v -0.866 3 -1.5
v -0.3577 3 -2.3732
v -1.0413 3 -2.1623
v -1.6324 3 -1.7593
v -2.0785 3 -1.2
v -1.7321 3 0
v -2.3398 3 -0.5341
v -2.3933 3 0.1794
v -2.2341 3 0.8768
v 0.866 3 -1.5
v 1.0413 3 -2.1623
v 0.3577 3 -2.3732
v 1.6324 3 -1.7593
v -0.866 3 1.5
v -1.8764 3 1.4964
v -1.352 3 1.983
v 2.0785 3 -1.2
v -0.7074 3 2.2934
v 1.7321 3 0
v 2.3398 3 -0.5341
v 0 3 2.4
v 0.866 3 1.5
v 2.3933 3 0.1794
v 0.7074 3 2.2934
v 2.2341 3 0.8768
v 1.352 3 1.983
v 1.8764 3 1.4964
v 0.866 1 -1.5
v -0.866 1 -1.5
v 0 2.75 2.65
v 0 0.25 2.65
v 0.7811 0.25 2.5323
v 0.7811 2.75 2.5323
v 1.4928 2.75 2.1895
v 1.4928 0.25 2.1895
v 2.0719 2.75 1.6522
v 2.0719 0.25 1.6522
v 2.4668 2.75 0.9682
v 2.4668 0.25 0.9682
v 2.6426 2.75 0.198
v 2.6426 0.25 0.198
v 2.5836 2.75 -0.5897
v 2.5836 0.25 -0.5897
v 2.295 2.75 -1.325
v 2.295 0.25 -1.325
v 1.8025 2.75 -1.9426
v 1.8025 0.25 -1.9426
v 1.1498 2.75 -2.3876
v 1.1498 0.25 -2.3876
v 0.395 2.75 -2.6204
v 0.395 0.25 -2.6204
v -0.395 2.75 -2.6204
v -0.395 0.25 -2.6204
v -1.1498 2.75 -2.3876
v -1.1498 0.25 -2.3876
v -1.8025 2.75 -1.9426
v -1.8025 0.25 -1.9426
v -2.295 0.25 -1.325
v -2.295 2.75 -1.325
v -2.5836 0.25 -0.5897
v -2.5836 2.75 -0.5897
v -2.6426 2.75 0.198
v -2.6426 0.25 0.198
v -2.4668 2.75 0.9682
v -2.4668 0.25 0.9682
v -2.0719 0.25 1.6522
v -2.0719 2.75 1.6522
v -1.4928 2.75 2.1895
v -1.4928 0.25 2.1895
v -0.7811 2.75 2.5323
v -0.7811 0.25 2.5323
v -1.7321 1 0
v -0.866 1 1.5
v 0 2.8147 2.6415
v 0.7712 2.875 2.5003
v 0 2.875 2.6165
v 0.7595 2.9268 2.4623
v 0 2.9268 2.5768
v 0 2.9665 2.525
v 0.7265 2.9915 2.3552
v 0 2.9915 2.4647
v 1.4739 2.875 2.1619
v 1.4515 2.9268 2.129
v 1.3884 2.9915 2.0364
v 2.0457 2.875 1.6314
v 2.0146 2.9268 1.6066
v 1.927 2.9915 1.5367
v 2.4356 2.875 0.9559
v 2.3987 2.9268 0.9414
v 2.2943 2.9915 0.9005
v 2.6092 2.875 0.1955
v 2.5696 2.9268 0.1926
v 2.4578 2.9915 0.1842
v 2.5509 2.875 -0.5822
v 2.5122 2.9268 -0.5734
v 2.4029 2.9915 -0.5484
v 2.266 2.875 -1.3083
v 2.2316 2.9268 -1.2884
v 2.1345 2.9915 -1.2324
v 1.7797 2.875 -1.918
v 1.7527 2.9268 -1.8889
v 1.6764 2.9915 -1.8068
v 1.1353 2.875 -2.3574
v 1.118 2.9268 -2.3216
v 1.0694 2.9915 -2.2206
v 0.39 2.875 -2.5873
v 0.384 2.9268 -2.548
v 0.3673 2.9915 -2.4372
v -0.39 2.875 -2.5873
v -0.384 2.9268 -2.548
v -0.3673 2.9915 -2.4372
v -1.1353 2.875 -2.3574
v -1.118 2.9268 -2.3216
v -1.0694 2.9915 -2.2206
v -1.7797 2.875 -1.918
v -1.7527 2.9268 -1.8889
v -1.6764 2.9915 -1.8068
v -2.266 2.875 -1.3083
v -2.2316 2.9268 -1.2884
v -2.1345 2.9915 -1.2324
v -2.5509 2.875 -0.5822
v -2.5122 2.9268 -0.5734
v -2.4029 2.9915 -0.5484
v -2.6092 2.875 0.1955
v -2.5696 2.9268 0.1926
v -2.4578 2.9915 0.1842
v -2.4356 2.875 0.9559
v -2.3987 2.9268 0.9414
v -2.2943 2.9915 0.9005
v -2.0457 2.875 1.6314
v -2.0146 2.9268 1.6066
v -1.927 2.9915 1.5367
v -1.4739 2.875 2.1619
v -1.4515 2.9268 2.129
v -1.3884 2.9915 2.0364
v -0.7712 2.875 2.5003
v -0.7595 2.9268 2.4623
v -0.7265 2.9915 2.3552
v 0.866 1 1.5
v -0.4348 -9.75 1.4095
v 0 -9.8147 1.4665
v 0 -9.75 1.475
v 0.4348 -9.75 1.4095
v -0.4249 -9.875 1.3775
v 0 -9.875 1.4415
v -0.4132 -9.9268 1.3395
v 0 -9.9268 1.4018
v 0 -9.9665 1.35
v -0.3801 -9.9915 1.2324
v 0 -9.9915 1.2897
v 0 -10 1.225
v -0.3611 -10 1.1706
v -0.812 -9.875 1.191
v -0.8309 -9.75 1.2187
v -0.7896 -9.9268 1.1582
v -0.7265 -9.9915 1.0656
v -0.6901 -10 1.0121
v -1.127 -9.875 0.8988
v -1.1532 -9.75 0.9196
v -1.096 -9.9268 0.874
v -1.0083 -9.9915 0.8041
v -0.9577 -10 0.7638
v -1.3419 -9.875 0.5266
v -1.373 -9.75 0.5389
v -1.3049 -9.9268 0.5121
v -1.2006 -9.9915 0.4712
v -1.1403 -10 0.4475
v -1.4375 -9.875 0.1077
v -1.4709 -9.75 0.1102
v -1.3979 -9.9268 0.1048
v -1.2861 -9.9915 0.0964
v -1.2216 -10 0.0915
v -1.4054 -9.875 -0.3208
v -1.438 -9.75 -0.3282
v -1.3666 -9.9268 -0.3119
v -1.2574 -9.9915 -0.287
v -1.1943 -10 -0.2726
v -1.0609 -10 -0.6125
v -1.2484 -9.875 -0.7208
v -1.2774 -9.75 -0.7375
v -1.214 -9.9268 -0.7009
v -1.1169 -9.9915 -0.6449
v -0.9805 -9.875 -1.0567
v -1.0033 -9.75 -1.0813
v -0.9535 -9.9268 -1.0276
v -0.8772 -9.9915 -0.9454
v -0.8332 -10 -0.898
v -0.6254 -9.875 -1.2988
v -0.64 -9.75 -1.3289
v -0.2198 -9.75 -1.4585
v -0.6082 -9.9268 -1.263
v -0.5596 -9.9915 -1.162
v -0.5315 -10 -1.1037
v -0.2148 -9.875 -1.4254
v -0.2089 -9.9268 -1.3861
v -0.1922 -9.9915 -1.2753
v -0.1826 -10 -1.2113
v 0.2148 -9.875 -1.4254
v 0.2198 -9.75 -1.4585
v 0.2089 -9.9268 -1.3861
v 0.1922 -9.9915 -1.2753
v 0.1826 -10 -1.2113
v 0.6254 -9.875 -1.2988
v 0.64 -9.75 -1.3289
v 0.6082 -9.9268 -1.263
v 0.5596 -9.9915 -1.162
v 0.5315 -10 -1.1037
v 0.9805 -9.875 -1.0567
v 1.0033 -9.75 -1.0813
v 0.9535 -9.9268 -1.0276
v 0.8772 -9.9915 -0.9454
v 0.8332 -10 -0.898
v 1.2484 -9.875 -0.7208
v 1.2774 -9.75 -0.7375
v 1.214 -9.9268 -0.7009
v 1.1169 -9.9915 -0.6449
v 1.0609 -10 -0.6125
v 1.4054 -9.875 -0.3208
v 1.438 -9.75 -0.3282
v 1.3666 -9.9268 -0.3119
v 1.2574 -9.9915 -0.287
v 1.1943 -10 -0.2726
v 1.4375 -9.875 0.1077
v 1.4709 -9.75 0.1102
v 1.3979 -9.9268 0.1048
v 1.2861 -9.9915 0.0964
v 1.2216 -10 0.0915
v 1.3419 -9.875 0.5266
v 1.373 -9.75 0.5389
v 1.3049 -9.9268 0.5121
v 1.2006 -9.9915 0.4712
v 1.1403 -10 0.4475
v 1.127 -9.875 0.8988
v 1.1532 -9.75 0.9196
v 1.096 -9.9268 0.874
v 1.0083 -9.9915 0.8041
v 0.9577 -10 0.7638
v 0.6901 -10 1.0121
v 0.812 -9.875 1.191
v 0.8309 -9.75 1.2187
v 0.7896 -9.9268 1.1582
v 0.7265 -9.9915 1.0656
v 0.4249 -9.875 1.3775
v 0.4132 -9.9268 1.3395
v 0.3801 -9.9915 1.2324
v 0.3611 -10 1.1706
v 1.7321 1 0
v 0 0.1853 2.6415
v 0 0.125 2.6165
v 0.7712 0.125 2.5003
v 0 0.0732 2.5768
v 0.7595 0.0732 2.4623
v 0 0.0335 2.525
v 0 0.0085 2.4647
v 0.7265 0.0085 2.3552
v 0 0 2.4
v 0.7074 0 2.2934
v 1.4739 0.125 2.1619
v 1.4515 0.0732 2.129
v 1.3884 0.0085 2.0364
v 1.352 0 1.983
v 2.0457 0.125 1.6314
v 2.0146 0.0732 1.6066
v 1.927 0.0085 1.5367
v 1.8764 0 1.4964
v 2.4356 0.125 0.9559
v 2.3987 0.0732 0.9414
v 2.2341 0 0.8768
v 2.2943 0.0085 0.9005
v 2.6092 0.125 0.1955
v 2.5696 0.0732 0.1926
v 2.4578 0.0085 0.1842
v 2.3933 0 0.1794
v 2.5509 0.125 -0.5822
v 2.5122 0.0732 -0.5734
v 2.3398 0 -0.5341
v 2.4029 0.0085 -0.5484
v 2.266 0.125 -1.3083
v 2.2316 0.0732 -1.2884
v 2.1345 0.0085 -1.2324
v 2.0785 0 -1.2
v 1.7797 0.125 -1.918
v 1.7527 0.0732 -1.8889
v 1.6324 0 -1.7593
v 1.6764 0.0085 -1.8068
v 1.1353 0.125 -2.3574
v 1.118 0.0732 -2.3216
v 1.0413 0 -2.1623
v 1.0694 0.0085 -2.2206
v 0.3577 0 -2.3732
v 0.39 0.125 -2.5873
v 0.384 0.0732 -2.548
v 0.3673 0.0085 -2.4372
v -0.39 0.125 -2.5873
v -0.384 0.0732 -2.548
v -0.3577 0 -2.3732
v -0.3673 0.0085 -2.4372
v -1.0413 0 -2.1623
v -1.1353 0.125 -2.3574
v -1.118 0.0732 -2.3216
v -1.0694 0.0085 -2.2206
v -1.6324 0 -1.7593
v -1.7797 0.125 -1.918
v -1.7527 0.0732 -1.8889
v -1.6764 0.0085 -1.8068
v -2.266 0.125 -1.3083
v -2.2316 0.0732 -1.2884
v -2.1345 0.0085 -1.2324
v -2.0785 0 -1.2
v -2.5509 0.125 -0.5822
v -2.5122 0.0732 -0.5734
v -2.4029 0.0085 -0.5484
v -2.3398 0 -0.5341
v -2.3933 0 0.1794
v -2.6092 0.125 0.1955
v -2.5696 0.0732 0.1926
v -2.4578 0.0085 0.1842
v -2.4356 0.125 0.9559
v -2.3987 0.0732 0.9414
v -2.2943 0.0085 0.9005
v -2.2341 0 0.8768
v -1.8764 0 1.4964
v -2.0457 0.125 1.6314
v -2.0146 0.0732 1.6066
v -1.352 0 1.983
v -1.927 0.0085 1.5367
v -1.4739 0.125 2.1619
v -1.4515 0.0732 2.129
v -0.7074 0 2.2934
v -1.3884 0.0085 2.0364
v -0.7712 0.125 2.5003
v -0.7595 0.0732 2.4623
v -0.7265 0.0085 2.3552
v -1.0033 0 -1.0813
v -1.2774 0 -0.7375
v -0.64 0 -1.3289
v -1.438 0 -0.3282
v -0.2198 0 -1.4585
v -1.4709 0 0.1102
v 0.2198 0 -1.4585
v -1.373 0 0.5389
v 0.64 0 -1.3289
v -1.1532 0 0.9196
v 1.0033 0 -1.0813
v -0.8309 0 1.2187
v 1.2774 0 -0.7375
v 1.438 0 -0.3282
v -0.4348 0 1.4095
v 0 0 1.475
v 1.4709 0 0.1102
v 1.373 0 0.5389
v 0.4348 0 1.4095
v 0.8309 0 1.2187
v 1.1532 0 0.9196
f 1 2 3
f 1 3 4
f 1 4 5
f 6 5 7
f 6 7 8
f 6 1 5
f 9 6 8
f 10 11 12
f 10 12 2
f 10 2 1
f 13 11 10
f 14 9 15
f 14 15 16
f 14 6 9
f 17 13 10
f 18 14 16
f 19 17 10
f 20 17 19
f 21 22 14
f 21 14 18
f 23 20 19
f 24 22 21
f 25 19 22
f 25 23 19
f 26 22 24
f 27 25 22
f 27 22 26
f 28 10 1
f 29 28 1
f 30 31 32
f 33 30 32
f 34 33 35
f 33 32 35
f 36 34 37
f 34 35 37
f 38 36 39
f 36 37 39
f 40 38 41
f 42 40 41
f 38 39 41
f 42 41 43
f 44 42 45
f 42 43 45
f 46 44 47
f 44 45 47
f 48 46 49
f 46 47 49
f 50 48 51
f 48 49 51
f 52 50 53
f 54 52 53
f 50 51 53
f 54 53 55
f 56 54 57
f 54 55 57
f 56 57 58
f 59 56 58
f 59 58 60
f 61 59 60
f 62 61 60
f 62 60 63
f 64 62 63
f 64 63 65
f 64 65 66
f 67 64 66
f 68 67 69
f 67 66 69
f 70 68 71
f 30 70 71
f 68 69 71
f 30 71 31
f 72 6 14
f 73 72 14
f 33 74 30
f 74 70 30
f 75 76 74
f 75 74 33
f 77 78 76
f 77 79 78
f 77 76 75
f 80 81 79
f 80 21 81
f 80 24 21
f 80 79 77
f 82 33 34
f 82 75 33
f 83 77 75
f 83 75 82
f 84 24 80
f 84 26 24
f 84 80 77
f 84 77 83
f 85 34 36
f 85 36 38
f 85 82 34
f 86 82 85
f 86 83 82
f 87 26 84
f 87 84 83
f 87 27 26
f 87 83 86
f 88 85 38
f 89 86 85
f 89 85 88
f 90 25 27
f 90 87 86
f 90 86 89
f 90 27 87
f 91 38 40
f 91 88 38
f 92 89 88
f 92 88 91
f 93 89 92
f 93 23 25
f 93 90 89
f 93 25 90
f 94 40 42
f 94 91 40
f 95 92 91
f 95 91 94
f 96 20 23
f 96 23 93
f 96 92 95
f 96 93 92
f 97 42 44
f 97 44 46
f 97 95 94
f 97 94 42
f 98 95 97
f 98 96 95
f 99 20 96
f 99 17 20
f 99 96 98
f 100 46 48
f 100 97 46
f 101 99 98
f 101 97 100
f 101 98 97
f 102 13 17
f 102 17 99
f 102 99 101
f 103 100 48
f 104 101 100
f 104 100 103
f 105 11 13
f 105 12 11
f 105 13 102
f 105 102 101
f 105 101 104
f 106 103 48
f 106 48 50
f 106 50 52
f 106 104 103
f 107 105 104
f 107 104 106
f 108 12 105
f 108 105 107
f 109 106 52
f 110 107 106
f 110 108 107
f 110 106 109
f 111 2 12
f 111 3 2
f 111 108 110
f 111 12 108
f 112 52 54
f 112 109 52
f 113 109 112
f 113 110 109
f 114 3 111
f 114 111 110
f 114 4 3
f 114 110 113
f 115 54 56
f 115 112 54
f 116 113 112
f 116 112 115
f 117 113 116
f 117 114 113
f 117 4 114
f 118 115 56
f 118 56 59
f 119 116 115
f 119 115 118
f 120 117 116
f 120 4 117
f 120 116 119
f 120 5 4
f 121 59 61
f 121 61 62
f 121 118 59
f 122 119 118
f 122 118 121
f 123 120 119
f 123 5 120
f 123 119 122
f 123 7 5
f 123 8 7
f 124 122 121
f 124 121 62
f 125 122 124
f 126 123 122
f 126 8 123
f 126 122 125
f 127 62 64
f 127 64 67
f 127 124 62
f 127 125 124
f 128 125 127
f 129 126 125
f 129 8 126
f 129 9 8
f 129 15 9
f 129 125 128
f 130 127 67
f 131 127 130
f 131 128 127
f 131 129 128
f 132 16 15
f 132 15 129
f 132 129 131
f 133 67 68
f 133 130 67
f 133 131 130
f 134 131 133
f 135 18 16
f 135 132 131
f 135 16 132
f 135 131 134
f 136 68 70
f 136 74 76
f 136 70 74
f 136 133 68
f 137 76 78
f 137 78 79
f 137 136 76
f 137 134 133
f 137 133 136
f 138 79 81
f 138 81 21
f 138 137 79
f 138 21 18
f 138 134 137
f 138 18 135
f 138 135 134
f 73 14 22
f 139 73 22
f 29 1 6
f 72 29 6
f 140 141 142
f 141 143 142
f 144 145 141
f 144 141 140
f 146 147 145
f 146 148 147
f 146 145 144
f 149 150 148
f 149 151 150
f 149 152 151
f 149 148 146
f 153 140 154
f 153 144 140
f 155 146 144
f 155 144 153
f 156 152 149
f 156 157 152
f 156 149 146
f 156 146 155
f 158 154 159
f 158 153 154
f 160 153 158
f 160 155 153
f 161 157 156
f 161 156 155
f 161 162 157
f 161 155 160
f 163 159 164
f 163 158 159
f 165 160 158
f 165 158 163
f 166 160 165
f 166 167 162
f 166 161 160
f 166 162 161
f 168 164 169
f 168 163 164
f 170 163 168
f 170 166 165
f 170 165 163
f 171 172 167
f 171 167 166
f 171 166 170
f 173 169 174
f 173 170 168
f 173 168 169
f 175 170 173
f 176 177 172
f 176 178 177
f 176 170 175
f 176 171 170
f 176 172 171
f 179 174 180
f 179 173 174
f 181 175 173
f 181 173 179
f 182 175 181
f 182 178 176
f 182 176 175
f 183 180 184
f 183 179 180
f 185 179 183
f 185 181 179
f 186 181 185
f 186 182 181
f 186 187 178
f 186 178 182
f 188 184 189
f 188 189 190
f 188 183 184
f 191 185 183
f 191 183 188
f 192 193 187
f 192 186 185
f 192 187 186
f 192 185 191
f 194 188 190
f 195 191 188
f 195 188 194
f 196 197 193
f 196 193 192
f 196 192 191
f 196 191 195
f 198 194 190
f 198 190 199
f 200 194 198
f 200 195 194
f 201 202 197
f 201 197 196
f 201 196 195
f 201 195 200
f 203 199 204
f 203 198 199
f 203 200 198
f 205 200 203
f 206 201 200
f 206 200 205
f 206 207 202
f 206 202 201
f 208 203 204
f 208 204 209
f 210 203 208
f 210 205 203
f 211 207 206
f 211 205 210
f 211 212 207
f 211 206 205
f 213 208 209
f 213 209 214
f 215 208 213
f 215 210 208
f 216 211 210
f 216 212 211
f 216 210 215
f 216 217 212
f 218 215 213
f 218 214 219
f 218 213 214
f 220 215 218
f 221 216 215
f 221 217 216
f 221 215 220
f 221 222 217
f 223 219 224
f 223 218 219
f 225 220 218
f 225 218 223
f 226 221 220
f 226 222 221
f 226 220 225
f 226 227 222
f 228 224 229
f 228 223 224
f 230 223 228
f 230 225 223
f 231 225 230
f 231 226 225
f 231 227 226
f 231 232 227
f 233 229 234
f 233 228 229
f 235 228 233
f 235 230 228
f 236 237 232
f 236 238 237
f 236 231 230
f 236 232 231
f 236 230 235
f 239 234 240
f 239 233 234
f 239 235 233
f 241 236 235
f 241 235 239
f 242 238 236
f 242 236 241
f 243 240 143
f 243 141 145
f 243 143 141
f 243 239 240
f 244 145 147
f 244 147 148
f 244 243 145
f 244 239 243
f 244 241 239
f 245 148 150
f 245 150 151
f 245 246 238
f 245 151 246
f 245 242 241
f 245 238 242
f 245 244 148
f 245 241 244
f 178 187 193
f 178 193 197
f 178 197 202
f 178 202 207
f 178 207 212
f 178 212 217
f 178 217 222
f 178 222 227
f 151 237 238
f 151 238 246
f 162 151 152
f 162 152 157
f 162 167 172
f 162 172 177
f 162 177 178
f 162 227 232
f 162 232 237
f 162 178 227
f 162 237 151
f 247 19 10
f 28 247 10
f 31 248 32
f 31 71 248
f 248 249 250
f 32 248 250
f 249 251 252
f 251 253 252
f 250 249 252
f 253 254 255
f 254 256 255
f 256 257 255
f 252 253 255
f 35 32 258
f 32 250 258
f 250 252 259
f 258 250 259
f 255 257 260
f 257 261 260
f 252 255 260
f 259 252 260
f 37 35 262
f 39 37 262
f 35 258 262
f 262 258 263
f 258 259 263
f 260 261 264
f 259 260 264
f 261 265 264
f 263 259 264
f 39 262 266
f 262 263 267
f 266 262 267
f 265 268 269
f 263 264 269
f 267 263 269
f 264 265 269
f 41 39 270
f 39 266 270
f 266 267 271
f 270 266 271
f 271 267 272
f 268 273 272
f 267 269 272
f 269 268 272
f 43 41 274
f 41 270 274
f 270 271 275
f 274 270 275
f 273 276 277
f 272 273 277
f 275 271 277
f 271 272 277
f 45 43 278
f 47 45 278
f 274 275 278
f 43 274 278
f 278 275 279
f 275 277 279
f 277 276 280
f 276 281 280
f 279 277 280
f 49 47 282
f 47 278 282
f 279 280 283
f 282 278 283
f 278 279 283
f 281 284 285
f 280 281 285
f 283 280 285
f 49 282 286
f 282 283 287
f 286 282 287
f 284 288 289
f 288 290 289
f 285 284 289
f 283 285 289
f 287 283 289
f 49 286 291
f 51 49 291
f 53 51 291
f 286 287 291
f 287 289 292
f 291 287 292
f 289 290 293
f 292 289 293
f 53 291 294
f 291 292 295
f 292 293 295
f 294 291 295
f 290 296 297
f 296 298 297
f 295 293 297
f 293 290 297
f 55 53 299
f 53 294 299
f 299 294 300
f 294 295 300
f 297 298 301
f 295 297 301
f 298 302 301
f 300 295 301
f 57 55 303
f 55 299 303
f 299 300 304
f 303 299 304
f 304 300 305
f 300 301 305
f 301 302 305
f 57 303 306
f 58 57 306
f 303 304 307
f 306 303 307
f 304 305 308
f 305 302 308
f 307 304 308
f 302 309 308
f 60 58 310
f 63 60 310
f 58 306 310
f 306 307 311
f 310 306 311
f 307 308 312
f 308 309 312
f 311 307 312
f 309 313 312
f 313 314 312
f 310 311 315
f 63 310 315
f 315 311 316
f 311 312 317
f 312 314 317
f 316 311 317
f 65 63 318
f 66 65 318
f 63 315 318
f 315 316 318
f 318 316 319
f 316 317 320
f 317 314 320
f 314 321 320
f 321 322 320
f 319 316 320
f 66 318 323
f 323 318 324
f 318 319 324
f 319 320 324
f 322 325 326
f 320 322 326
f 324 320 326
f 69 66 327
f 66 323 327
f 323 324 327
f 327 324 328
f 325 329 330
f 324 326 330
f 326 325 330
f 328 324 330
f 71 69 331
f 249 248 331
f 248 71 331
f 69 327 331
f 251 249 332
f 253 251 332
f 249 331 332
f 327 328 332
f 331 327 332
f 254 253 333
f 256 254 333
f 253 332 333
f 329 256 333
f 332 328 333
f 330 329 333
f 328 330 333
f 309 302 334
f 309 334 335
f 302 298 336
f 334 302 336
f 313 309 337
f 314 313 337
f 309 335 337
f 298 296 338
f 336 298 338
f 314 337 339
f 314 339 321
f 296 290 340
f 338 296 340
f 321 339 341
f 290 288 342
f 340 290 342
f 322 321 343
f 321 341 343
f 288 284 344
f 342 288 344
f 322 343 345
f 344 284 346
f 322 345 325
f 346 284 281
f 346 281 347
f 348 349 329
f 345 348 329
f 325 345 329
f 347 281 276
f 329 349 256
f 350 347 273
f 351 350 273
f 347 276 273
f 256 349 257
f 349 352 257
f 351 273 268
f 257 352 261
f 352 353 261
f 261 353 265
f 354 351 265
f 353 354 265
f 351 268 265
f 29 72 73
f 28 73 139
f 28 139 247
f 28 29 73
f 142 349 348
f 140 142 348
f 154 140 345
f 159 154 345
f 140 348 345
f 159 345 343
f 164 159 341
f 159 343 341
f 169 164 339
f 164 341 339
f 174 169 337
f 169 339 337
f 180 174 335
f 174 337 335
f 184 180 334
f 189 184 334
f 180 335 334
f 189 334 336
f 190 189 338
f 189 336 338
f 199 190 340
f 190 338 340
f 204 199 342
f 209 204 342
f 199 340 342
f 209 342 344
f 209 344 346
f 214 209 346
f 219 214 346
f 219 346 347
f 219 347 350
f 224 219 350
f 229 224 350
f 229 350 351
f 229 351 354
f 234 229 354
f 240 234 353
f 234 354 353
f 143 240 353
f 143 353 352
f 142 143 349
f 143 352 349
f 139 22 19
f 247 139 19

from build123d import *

# Parameters (mm, degrees)
SKETCH1_R           = 2.65
BOSS_EXTRUDE1_DEPTH = 3
SKETCH2_R           = 1.475
BOSS_EXTRUDE2_DEPTH = 10
FILLET1_R           = 0.25
CUT_EXTRUDE1_DEPTH  = 2


with BuildPart() as part:
    # Sketch1 → Boss-Extrude1 (new body)
    with BuildSketch(Plane(origin=(0, 0, 0), x_dir=(1, 0, 0), z_dir=(0, 1, 0))):
        with Locations(Location((0, 0, 0), (0, 0, 270))):
            Circle(SKETCH1_R)
    extrude(amount=BOSS_EXTRUDE1_DEPTH)

    # Sketch2 → Boss-Extrude2 (add)
    with BuildSketch(Plane.XZ):
        with Locations(Location((0, 0, 0), (0, 0, 90))):
            Circle(SKETCH2_R)
    extrude(amount=BOSS_EXTRUDE2_DEPTH)

    # Fillet1
    fillet1_edges = [part.edges().sort_by_distance(p)[0] for p in [
        (0, 0, -2.65),
        (0, 3, -2.65),
        (0, -10, -1.475),
    ]]
    fillet(fillet1_edges, radius=FILLET1_R)

    # Sketch3 → Cut-Extrude1 (cut)
    with BuildSketch(Plane(origin=(0, 3, 0), x_dir=(1, 0, 0), z_dir=(0, 1, 0))):
        Polygon((1.732050808, 0), (0.866025404, 1.5), (-0.866025404, 1.5), (-1.732050808, 0), (-0.866025404, -1.5), (0.866025404, -1.5), align=None)
    extrude(amount=-CUT_EXTRUDE1_DEPTH, mode=Mode.SUBTRACT)


solid = part.part
